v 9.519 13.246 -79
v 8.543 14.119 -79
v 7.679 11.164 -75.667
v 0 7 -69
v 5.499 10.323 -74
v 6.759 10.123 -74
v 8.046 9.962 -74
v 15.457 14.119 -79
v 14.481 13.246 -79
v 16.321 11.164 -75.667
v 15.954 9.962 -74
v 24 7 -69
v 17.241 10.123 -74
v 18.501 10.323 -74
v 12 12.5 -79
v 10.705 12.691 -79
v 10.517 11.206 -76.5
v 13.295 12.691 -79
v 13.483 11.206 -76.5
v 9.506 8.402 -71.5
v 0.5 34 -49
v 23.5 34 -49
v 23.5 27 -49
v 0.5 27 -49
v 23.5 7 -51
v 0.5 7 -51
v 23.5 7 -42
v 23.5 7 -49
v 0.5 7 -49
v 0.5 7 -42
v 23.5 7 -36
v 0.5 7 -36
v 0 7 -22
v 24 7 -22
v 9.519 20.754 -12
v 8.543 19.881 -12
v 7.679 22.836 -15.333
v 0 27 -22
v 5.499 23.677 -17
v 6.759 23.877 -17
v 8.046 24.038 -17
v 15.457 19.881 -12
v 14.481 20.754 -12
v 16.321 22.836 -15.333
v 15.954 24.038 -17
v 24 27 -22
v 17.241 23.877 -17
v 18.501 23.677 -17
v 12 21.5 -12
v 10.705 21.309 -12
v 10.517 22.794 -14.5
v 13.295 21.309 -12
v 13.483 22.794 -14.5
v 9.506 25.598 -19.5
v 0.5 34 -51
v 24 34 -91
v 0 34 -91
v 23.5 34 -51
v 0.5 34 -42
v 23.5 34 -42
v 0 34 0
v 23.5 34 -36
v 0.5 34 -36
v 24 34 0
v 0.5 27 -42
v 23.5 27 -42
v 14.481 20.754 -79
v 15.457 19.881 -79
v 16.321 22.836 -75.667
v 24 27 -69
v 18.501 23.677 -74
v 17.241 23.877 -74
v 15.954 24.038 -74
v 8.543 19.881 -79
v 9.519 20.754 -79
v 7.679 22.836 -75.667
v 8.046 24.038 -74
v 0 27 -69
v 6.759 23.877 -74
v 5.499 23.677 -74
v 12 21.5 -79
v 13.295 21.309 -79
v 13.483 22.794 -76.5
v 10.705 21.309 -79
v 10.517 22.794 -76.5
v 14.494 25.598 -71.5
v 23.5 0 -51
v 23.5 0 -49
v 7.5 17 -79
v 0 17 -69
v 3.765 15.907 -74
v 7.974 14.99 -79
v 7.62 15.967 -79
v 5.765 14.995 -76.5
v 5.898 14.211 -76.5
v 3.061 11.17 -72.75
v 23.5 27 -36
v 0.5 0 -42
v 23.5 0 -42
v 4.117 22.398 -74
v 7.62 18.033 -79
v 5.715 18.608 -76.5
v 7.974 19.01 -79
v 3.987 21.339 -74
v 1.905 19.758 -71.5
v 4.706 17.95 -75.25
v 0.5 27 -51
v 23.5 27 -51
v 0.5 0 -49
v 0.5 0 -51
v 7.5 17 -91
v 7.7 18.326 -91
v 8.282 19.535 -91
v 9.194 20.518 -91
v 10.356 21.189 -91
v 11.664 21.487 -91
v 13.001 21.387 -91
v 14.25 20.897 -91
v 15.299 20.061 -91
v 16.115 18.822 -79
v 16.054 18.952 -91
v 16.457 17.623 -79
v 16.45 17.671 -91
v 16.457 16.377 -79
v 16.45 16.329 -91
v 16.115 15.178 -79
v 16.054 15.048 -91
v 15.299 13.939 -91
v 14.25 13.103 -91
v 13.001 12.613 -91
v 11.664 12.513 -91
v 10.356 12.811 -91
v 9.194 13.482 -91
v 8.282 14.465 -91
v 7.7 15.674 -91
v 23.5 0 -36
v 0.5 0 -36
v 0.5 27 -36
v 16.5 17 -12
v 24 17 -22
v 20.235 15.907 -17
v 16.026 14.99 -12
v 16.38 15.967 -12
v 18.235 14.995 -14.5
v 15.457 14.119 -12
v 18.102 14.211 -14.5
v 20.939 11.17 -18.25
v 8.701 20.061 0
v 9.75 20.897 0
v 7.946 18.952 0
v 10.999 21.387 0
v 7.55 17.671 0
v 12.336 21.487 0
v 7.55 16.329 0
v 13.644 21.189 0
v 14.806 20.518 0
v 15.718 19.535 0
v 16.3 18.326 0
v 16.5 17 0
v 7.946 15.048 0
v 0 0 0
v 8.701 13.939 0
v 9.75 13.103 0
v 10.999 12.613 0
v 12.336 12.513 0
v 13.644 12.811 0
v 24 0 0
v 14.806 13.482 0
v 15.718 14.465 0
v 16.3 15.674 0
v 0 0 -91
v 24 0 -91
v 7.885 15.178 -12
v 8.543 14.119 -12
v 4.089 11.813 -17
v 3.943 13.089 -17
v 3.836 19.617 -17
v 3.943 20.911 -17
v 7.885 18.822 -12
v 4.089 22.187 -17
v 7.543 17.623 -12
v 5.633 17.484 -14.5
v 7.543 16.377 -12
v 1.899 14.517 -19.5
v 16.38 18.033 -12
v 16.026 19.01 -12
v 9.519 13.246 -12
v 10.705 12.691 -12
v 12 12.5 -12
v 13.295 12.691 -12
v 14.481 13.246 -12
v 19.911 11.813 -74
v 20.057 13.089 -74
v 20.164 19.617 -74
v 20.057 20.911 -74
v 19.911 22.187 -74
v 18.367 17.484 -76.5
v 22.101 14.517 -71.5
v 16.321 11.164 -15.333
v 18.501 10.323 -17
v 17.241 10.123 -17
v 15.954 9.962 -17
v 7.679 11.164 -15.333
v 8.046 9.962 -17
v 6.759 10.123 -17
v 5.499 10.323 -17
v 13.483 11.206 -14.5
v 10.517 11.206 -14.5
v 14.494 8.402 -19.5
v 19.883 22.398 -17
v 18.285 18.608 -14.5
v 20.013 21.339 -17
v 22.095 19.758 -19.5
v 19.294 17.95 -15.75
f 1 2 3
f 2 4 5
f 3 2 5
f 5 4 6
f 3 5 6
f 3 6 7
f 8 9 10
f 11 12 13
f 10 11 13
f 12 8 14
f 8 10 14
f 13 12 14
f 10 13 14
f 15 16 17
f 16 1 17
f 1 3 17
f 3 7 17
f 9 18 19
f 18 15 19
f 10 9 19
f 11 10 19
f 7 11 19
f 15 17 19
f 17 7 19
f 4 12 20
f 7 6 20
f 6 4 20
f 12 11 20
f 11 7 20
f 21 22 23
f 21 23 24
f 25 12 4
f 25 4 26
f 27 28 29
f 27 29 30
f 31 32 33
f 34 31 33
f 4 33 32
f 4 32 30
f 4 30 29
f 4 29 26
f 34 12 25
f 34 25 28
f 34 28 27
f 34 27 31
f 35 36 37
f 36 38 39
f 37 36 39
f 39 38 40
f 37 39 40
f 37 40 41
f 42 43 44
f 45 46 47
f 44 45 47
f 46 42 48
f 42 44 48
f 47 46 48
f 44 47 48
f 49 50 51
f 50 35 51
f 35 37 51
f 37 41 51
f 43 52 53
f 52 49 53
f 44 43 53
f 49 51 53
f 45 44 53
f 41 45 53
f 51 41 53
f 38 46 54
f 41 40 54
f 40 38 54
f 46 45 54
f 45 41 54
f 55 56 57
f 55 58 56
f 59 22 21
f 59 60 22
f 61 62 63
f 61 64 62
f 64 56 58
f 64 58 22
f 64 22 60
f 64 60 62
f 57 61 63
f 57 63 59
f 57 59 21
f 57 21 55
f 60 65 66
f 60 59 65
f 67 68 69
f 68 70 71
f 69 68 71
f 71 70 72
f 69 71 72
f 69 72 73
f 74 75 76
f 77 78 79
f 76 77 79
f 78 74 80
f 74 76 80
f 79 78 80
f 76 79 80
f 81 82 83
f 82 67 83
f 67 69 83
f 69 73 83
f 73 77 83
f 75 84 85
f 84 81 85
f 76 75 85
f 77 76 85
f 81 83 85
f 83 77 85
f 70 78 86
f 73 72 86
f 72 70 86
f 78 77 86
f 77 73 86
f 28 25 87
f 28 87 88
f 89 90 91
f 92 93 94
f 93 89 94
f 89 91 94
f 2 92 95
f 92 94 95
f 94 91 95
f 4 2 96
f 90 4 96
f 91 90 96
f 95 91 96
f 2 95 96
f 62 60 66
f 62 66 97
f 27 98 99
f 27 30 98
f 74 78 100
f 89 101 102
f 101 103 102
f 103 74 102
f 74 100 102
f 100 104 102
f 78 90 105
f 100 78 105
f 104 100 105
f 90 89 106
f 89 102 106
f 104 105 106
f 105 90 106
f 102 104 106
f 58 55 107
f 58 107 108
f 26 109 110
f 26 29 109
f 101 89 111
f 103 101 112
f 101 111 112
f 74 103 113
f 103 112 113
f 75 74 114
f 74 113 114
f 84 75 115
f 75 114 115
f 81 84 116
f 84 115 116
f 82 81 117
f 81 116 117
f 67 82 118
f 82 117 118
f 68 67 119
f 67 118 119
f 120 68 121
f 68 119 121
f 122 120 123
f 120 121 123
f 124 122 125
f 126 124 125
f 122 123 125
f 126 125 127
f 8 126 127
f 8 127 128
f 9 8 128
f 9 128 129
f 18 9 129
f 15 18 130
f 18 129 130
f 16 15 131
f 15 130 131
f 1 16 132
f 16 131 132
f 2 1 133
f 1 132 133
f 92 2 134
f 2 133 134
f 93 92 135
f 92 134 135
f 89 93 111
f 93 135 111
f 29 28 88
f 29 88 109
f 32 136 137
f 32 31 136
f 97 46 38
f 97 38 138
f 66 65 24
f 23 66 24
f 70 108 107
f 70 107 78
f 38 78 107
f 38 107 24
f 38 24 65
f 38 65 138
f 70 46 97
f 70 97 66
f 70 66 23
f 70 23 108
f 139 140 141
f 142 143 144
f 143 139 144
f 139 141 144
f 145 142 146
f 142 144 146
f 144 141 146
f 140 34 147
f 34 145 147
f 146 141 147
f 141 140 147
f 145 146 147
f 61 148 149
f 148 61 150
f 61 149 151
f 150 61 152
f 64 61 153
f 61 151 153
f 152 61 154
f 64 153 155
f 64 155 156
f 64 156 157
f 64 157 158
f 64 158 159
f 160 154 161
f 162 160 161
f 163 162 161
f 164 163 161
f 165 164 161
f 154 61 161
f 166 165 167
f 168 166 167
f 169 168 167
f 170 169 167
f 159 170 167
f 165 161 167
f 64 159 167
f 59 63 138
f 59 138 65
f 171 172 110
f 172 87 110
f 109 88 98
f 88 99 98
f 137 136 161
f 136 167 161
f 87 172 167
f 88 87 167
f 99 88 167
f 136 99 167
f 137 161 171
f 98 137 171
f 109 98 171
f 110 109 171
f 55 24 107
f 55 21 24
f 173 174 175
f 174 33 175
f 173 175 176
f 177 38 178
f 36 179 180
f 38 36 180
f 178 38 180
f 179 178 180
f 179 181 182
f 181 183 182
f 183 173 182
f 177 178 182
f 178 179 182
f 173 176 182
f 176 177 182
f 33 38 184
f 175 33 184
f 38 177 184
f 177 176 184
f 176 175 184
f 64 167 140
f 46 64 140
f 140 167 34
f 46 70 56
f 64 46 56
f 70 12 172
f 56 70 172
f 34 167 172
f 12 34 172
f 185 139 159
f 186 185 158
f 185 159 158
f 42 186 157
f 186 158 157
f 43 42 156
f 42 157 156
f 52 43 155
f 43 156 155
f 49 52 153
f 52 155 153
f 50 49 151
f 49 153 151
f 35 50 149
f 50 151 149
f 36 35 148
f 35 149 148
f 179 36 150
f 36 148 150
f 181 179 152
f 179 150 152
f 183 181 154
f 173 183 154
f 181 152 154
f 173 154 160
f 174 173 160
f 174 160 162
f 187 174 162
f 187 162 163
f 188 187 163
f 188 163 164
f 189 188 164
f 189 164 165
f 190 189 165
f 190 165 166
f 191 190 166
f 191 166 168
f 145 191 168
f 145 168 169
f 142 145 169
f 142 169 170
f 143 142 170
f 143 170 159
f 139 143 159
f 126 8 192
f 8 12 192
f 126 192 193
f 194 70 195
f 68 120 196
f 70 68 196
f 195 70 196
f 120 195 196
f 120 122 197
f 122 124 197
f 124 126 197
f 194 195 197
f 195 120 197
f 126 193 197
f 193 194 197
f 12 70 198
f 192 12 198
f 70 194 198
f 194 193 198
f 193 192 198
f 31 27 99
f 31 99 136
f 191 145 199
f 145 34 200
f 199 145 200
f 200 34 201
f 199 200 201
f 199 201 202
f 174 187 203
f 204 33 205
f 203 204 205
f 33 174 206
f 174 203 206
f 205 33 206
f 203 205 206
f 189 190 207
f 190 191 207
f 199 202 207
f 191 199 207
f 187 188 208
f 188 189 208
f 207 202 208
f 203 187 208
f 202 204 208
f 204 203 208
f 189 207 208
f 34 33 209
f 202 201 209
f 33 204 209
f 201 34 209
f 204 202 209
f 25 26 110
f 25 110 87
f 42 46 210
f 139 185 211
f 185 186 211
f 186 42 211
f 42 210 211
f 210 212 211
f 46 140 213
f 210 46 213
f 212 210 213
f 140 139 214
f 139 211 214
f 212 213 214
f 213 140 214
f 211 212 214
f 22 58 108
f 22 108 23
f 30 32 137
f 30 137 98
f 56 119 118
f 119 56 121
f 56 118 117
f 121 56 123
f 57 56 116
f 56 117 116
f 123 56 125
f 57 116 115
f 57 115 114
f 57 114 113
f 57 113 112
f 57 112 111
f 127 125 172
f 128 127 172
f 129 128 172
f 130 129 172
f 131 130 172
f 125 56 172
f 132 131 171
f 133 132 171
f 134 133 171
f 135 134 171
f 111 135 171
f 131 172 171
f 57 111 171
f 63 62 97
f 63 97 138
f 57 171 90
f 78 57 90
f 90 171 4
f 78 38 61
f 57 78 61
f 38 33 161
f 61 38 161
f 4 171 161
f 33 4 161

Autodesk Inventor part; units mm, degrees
ref_plane "YZ Plane" through (0, 0, 0) normal (1, 0, 0) x (0, 1, 0)
ref_plane "XZ Plane" through (0, 0, 0) normal (0, 1, 0) x (-1, 0, 0)
ref_plane "XY Plane" through (0, 0, 0) normal (0, 0, 1) x (1, 0, 0)
sketch "Sketch1" plane through (0, 0, 0) normal (0, 1, 0) x (-1, 0, 0)
  line L0 (0, 0) -> (-24, 0)
  line L1 (-24, 0) -> (-24, -91)
  line L2 (-24, -91) -> (0, -91)
  line L3 (0, -91) -> (0, 0)
  dimension "d0" = 91
  dimension "d1" = 24
extrude "Extrusion1" add sketch "Sketch1" along normal blind 34
sketch "Sketch2" plane through (24, 0, 0) normal (1, 0, 0) x (0, 0, -1)
  line L0 (22, 27) -> (69, 27)
  line L1 (69, 27) -> (69, 7)
  line L2 (69, 7) -> (22, 7)
  line L3 (22, 7) -> (22, 27)
  line L4 (0, 34) -> (91, 34) projected
  line L5 (0, 0) -> (91, 0) projected
  line L6 (0, 0) -> (0, 34) projected
  line L7 (91, 0) -> (91, 34) projected
  dimension "d4" = 7
  dimension "d5" = 7
  dimension "d6" = 22
  dimension "d7" = 22
extrude "Extrusion2" cut sketch "Sketch2" against normal up to surface (24 mm away) contours L0 L1 L2 L3
sketch "Sketch3" plane through (0, 34, 0) normal (0, 1, 0) x (1, 0, 0)
  line L0 (0.5, 42) -> (23.5, 42)
  line L1 (23.5, 42) -> (23.5, 36)
  line L2 (23.5, 36) -> (0.5, 36)
  line L3 (0.5, 36) -> (0.5, 42)
  line L4 (0, 91) -> (0, 0) projected
  line L5 (24, 0) -> (24, 91) projected
  line L6 (0, 0) -> (24, 0) projected
  dimension "d10" = 0.5
  dimension "d11" = 0.5
  dimension "d12" = 6
  dimension "d13" = 36
extrude "Extrusion3" cut sketch "Sketch3" against normal up to surface (34 mm away)
sketch "Sketch4" plane through (0, 34, 0) normal (0, 1, 0) x (1, 0, 0)
  line L0 (0.5, 51) -> (23.5, 51)
  line L1 (23.5, 51) -> (23.5, 49)
  line L2 (23.5, 49) -> (0.5, 49)
  line L3 (0.5, 49) -> (0.5, 51)
  line L4 (0.5, 42) -> (23.5, 42) projected
  line L5 (24, 0) -> (24, 91) projected
  line L6 (0, 91) -> (0, 0) projected
  dimension "d16" = 2
  dimension "d17" = 7
  dimension "d18" = 0.5
  dimension "d19" = 0.5
extrude "Extrusion4" cut sketch "Sketch4" against normal up to surface (34 mm away)
sketch "Sketch5" plane through (0, 0, 0) normal (0, 0, 1) x (1, 0, 0)
  circle A0 centre (12, 17) radius 4.5
  line L0 (0, 0) -> (24, 0) projected
  line L1 (24, 0) -> (24, 34) projected
  dimension "d22" = 17
  dimension "d23" = 12
  dimension "d24" = 9
extrude "Extrusion5" cut sketch "Sketch5" against normal blind 12
loft "Loft1" cut section 1 edges at (7.5, 17, -12) section 2 edges at (0, 17, -22) (12, 27, -22) (24, 17, -22) (12, 7, -22)
sketch "Sketch6" plane through (24, 0, -91) normal (0, 0, -1) x (-1, 0, 0)
  circle A0 centre (12, 17) radius 4.5
  line L0 (24, 0) -> (24, 34) projected
  line L1 (0, 0) -> (24, 0) projected
  dimension "d31" = 12
  dimension "d32" = 17
  dimension "d33" = 9
extrude "Extrusion6" cut sketch "Sketch6" against normal blind 12
loft "Loft2" cut section 1 edges at (16.5, 17, -79) section 2 edges at (0, 17, -69) (12, 7, -69) (24, 17, -69) (12, 27, -69)
properties part number "20220727_1cell_PBME"
